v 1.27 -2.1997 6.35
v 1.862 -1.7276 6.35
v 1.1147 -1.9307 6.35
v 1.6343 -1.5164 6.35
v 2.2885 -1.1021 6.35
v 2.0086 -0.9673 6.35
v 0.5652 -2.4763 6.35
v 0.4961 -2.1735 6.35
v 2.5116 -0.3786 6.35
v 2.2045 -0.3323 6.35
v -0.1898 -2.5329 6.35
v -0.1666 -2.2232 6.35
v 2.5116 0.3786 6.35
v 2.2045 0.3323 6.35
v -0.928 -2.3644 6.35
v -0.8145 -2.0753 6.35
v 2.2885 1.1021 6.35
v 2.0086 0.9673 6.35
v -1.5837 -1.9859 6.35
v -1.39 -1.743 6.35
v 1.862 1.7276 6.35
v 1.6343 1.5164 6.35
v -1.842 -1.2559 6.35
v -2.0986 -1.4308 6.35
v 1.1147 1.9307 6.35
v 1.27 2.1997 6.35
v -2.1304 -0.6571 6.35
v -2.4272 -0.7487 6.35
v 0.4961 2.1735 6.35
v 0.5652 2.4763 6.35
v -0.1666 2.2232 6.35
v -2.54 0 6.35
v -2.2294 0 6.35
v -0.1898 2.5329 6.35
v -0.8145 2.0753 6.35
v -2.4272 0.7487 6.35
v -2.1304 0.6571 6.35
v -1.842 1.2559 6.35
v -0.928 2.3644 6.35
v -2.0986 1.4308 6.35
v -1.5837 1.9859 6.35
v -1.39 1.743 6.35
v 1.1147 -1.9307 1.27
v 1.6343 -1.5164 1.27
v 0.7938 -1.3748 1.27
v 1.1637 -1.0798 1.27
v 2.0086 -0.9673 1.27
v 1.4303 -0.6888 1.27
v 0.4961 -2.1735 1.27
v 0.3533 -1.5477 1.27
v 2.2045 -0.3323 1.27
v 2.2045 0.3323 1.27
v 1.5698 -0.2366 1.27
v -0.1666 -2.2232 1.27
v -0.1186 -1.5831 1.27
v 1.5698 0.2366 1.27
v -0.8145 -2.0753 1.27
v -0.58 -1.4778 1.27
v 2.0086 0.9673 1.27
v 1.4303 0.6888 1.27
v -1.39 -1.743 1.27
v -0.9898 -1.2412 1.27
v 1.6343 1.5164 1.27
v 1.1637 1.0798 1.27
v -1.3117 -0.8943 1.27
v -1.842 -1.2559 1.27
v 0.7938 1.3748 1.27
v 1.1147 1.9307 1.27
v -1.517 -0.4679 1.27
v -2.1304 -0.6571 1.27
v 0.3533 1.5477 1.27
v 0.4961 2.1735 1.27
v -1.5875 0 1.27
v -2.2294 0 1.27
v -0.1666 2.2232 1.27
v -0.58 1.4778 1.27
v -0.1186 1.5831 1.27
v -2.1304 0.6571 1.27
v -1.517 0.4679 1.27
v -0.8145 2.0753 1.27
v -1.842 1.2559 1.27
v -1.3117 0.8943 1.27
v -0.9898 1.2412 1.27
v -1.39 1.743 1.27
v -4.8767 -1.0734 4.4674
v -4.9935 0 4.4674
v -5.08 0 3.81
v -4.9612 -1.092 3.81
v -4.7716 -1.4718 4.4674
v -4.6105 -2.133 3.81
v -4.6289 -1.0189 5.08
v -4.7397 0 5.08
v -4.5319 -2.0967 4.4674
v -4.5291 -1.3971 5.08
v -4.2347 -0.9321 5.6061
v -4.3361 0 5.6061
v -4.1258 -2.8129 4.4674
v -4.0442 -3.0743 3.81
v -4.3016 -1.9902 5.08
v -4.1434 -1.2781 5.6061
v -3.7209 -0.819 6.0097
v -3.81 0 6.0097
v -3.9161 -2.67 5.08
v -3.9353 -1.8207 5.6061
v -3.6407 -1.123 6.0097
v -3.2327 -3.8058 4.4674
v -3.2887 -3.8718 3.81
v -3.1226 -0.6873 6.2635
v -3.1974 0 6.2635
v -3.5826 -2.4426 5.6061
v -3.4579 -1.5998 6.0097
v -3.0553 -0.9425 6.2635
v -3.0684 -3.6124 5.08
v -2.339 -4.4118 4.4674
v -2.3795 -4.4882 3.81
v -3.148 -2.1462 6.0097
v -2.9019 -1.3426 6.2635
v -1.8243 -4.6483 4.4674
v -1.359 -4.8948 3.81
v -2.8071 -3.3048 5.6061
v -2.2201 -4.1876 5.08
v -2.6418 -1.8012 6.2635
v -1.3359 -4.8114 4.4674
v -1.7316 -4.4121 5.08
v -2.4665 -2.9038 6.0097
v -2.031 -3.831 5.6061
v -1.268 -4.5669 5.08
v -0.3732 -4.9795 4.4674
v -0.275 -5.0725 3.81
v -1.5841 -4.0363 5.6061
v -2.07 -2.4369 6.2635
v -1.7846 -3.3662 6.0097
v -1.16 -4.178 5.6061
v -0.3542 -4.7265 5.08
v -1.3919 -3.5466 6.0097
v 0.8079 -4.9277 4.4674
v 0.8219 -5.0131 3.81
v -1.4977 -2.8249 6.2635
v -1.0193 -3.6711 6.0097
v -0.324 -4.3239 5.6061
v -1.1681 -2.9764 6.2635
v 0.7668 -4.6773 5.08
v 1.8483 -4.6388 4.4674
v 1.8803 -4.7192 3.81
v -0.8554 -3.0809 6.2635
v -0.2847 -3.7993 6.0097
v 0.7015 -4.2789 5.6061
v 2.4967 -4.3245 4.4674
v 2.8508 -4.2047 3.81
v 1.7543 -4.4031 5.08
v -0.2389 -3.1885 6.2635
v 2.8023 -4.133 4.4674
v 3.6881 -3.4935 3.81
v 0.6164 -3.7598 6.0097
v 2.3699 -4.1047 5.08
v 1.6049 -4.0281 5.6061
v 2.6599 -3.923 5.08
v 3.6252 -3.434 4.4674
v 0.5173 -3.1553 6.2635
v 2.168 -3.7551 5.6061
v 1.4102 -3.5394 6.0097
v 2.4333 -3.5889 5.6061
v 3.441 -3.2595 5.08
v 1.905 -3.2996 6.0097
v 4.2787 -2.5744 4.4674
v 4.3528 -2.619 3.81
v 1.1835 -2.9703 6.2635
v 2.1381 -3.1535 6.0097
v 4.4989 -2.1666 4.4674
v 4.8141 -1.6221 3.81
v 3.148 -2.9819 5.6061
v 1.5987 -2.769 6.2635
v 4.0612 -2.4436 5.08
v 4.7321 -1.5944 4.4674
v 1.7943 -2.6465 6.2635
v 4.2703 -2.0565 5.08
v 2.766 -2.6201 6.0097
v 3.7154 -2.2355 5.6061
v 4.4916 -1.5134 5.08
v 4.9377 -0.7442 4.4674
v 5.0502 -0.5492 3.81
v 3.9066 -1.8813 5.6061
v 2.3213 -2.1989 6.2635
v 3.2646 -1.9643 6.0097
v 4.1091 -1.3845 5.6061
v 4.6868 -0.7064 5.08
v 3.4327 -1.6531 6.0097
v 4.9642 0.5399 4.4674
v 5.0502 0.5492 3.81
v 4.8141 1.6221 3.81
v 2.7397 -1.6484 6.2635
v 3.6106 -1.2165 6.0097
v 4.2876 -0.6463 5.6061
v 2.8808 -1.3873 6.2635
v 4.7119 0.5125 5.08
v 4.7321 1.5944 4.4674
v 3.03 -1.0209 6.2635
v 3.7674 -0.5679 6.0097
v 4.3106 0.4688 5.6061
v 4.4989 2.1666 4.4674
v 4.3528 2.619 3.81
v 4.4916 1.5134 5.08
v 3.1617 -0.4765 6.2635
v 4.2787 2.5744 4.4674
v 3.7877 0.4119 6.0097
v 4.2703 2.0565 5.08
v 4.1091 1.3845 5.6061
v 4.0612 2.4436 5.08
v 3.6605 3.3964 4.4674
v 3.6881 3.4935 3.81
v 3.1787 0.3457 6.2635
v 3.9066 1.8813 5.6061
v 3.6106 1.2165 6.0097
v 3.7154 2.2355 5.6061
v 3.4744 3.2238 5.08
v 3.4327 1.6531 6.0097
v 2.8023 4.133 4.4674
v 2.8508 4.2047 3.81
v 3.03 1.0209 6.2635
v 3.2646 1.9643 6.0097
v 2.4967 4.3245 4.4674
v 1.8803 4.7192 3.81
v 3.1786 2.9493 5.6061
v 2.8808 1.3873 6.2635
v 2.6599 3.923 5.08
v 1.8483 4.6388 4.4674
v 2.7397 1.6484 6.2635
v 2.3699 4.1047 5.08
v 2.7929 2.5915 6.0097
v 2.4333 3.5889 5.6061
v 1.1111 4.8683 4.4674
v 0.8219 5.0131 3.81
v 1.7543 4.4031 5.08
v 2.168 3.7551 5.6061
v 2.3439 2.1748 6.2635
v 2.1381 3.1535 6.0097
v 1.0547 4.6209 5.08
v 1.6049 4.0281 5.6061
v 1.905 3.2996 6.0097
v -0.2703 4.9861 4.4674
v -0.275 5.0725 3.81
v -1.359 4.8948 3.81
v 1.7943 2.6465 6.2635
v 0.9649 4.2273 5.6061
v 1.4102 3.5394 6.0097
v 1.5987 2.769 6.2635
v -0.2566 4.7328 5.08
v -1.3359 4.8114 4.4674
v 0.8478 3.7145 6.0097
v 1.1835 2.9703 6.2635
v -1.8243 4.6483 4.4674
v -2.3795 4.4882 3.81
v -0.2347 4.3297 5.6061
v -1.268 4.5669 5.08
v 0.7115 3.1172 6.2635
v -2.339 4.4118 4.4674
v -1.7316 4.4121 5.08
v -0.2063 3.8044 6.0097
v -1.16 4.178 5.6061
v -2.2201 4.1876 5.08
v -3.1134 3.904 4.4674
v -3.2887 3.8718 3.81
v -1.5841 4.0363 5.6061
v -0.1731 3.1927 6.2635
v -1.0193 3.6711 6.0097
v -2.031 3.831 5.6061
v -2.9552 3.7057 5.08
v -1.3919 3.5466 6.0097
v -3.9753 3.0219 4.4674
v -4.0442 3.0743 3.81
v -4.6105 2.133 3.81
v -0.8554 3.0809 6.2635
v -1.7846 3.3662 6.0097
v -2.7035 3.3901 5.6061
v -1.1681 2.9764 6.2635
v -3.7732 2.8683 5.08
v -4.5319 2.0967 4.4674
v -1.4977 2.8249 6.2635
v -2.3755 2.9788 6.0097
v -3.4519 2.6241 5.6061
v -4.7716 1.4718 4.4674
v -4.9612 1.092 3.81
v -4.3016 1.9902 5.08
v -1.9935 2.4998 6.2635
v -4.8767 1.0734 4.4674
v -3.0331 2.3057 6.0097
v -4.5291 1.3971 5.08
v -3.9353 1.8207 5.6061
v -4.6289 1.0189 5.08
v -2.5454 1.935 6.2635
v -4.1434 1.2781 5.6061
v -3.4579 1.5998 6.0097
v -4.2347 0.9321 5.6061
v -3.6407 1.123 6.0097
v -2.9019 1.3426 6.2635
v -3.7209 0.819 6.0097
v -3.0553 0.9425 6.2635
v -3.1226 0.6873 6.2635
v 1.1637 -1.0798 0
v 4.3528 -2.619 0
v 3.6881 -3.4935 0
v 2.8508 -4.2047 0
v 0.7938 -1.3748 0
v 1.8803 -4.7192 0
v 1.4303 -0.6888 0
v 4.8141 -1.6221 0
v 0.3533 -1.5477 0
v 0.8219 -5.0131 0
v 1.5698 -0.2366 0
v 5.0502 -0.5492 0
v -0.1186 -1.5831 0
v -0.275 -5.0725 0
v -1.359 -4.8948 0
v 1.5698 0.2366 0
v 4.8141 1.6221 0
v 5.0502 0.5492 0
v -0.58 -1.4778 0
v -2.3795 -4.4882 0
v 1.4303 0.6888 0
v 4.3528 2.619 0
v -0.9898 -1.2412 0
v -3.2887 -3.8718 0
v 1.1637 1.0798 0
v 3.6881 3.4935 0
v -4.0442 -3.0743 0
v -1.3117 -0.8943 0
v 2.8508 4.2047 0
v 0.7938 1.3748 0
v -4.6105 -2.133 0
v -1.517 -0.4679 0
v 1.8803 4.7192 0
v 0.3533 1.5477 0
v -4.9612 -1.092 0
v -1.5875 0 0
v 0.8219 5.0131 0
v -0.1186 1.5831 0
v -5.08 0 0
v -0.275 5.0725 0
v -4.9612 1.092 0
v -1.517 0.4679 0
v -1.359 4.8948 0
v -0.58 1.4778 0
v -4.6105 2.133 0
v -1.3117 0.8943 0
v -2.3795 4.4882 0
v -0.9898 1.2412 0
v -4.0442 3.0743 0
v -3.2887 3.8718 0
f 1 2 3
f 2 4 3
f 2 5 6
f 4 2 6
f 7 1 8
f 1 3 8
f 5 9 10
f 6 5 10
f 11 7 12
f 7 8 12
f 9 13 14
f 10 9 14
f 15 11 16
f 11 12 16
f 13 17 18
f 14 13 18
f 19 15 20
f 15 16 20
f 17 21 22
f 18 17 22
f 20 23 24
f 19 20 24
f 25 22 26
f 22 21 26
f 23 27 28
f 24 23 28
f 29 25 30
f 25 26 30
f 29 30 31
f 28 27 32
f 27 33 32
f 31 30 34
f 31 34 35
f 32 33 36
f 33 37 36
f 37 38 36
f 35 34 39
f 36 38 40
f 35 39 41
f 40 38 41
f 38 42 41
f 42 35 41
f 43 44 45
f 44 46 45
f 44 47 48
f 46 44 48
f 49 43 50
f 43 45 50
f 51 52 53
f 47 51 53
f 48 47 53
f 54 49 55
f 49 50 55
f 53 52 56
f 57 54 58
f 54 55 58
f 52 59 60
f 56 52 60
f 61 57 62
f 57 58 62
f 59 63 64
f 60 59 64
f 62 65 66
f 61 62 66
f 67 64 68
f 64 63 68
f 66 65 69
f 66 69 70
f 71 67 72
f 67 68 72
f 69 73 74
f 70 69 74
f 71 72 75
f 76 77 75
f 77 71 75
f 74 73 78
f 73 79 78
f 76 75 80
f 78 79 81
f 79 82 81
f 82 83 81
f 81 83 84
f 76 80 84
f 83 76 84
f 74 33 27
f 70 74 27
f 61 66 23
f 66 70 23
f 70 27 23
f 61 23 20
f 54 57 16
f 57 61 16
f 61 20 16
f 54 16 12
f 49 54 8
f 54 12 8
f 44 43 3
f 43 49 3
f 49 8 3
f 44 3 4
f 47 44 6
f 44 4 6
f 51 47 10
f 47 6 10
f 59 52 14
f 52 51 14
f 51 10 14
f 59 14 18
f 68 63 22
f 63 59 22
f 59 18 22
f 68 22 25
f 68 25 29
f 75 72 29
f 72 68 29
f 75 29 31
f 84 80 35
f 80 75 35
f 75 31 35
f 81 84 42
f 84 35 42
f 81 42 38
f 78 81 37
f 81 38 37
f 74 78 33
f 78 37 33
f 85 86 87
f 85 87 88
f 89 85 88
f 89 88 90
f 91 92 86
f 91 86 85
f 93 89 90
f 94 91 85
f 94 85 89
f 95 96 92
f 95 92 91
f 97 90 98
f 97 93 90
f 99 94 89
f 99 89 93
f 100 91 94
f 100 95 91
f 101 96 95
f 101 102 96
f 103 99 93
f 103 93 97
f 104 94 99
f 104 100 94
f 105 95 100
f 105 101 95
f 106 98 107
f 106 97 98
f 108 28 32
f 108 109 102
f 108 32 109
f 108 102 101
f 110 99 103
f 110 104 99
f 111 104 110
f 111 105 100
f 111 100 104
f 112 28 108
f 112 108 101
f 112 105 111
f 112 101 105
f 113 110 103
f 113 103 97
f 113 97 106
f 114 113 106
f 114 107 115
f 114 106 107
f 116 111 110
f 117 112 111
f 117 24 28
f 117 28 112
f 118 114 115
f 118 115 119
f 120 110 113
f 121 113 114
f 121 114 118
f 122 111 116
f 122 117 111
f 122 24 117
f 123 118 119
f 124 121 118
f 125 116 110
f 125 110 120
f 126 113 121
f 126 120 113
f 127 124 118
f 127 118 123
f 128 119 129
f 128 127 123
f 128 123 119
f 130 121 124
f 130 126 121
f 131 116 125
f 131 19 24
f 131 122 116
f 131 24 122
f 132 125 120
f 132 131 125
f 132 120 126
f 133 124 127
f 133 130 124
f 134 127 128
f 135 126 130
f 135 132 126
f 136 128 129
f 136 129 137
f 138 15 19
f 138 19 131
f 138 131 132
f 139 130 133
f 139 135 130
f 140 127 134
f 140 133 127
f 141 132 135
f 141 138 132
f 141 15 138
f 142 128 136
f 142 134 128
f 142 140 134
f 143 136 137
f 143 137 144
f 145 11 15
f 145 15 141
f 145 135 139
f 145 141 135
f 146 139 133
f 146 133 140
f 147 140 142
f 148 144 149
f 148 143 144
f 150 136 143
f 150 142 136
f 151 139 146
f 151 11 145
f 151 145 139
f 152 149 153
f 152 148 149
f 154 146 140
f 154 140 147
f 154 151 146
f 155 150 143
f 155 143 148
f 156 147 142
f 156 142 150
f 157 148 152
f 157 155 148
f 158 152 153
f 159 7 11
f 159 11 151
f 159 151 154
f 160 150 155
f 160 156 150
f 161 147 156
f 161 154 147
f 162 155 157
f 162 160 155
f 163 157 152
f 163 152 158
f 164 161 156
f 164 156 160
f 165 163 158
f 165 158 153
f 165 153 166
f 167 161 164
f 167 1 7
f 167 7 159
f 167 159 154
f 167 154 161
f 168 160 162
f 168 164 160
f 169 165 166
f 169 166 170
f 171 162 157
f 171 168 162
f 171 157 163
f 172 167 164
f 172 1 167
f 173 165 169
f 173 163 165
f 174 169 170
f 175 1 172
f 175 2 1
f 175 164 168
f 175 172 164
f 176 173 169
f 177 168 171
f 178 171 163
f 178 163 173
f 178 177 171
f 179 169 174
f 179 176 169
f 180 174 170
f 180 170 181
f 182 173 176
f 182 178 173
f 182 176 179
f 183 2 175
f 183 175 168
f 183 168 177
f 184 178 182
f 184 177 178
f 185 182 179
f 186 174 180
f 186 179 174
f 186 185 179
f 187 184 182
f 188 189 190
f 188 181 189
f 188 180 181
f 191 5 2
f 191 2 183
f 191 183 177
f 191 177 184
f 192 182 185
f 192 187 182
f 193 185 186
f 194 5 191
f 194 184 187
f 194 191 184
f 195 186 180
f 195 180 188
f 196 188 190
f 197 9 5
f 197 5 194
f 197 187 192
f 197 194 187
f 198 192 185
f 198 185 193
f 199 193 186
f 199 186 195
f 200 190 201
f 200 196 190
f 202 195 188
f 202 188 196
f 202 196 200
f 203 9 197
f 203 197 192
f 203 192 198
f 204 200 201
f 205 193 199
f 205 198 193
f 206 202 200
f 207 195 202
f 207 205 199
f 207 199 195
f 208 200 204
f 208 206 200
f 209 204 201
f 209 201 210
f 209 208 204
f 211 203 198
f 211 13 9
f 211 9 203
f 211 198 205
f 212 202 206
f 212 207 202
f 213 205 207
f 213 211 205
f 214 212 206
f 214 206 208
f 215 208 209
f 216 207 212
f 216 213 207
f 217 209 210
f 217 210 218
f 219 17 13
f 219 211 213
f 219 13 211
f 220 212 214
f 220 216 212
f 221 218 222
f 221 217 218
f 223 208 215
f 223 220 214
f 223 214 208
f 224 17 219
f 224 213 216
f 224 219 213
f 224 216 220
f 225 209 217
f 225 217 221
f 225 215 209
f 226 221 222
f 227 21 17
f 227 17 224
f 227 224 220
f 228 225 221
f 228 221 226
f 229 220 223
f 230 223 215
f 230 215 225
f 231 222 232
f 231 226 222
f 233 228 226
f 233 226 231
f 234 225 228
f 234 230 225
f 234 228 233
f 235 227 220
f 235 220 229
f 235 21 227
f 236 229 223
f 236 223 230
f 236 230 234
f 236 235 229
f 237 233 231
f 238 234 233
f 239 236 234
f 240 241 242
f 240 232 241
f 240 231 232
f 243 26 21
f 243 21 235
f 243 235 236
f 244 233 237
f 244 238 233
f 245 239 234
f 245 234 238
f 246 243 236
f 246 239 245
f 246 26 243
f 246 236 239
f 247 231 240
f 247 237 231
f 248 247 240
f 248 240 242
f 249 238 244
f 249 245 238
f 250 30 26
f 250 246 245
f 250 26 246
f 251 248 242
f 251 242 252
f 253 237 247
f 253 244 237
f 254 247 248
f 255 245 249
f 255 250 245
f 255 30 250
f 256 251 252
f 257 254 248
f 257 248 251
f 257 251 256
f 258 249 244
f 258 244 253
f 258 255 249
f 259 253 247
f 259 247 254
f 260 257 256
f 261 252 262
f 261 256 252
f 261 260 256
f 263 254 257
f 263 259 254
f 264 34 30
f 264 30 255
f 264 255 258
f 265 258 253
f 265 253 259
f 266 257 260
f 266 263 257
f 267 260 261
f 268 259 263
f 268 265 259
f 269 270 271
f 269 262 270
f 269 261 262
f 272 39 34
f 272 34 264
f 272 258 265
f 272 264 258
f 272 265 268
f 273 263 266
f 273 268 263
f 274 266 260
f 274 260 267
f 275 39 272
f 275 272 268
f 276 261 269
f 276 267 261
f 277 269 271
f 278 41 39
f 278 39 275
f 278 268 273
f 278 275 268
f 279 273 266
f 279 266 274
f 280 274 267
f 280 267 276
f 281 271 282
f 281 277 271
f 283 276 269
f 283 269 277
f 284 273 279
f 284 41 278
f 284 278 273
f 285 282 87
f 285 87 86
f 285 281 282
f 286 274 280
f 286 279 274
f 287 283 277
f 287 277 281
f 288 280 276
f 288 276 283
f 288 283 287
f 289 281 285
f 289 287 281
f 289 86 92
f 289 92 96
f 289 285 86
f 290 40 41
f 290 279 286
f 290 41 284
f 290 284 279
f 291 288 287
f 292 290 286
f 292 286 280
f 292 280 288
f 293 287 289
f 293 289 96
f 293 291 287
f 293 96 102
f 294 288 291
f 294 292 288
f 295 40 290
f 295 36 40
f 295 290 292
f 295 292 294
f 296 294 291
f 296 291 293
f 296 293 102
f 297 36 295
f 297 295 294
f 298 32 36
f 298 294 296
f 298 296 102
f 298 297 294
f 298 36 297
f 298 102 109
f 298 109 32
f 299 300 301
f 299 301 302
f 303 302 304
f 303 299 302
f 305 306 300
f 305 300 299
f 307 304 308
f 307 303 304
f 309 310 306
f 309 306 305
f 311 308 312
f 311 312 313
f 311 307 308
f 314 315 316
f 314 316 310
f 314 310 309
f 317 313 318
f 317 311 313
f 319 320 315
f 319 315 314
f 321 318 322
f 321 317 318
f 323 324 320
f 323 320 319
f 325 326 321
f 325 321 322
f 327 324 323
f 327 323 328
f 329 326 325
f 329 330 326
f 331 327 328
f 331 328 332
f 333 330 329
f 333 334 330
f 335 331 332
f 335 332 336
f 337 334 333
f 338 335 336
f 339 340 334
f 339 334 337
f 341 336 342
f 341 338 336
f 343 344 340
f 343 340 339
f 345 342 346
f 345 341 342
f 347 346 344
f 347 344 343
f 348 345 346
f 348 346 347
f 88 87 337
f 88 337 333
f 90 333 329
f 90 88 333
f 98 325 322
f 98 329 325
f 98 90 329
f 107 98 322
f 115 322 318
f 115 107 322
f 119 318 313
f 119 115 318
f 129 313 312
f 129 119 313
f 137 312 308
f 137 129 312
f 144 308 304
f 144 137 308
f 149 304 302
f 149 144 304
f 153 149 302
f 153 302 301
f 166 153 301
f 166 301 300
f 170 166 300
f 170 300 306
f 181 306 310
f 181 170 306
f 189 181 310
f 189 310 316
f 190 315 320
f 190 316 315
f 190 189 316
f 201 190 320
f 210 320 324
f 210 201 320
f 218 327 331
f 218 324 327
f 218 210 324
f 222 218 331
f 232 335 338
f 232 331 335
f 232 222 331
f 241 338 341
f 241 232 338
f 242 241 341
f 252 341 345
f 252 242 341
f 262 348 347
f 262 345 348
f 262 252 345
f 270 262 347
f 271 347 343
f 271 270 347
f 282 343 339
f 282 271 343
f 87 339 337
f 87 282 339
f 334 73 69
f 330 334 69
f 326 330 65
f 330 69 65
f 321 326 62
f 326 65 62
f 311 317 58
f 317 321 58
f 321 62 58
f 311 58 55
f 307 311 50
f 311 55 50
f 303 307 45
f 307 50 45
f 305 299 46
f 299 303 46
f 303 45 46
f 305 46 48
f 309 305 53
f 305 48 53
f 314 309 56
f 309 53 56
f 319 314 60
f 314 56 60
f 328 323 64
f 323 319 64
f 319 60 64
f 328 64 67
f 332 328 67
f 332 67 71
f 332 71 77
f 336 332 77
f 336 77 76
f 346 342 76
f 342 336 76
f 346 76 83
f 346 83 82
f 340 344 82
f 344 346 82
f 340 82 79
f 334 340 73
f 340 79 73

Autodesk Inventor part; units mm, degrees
ref_plane "YZ Plane" through (0, 0, 0) normal (1, 0, 0) x (0, 1, 0)
ref_plane "XZ Plane" through (0, 0, 0) normal (0, 1, 0) x (-1, 0, 0)
ref_plane "XY Plane" through (0, 0, 0) normal (0, 0, 1) x (1, 0, 0)
sketch "Sketch1" plane through (0, 0, 0) normal (0, 1, 0) x (-1, 0, 0)
  line L0 (0, 0) -> (5.08, 0)
  line L1 (5.08, 0) -> (5.08, 3.81)
  line L2 (2.54, 6.35) -> (0, 6.35)
  line L3 (0, 6.35) -> (0, 0)
  arc A0 (5.08, 3.81) -> (2.54, 6.35) centre (2.54, 3.81) ccw
  line L4 (1.5875, 0) -> (1.5875, 1.27)
  line L5 (1.5875, 1.27) -> (2.2294, 1.27)
  line L6 (2.2294, 1.27) -> (2.2294, 6.35)
  dimension "d0" = 2.54
  dimension "d1" = 5.08
  dimension "d2" = 6.35
  dimension "d3" = 1.5875
  dimension "d5" = 1.27
revolve "Revolution1" add sketch "Sketch1" angle 360 about axis through (0, 0, 6.35) along (0, 0, -1) contours L4 L5 L6 L2 A0 L1 L0
properties part number "Feet"
